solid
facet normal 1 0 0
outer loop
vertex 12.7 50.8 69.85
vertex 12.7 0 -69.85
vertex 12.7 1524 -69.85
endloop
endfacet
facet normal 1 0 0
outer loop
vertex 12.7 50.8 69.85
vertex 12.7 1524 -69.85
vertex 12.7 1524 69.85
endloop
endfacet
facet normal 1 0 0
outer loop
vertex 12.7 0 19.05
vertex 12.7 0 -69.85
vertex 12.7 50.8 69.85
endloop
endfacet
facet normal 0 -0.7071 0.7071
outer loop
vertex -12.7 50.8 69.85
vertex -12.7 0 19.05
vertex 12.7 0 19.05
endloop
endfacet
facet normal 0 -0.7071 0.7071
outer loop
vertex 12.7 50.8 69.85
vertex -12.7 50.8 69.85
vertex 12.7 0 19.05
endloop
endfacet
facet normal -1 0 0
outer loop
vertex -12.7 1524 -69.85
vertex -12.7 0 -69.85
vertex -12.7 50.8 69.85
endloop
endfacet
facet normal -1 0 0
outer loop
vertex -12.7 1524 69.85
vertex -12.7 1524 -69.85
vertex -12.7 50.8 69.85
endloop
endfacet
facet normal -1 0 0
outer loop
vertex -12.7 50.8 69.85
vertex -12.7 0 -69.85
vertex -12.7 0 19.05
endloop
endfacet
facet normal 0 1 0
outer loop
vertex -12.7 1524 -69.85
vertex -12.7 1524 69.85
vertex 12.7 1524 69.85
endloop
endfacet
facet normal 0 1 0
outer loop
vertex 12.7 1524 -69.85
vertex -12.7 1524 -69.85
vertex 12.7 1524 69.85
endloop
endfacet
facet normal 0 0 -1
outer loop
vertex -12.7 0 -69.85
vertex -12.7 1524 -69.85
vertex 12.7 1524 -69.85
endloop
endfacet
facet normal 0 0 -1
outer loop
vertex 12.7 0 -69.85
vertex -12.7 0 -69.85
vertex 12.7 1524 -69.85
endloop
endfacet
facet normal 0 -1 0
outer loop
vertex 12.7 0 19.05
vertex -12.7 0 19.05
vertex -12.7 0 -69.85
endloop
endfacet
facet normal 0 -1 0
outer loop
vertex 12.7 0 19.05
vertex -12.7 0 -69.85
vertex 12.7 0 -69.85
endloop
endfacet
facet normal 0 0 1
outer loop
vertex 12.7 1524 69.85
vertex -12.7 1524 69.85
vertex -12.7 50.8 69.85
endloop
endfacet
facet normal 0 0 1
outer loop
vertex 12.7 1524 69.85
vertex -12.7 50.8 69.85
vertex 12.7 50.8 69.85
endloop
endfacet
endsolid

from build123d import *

# Parameters (mm, degrees)
F0_W     = 25.4
F0_H     = 139.7
F1_DEPTH = 1524
F2_SIZE  = 50.8


with BuildPart() as f1:
    # F0 (on Front) → F1 (new body)
    with BuildSketch(Plane.XZ):
        Rectangle(F0_W, F0_H)
    extrude(amount=-F1_DEPTH)

    # F2
    f2_edges = [f1.edges().sort_by_distance(p)[0] for p in [
        (0, 0, 69.85),
    ]]
    chamfer(f2_edges, length=F2_SIZE)


solid = f1.part
